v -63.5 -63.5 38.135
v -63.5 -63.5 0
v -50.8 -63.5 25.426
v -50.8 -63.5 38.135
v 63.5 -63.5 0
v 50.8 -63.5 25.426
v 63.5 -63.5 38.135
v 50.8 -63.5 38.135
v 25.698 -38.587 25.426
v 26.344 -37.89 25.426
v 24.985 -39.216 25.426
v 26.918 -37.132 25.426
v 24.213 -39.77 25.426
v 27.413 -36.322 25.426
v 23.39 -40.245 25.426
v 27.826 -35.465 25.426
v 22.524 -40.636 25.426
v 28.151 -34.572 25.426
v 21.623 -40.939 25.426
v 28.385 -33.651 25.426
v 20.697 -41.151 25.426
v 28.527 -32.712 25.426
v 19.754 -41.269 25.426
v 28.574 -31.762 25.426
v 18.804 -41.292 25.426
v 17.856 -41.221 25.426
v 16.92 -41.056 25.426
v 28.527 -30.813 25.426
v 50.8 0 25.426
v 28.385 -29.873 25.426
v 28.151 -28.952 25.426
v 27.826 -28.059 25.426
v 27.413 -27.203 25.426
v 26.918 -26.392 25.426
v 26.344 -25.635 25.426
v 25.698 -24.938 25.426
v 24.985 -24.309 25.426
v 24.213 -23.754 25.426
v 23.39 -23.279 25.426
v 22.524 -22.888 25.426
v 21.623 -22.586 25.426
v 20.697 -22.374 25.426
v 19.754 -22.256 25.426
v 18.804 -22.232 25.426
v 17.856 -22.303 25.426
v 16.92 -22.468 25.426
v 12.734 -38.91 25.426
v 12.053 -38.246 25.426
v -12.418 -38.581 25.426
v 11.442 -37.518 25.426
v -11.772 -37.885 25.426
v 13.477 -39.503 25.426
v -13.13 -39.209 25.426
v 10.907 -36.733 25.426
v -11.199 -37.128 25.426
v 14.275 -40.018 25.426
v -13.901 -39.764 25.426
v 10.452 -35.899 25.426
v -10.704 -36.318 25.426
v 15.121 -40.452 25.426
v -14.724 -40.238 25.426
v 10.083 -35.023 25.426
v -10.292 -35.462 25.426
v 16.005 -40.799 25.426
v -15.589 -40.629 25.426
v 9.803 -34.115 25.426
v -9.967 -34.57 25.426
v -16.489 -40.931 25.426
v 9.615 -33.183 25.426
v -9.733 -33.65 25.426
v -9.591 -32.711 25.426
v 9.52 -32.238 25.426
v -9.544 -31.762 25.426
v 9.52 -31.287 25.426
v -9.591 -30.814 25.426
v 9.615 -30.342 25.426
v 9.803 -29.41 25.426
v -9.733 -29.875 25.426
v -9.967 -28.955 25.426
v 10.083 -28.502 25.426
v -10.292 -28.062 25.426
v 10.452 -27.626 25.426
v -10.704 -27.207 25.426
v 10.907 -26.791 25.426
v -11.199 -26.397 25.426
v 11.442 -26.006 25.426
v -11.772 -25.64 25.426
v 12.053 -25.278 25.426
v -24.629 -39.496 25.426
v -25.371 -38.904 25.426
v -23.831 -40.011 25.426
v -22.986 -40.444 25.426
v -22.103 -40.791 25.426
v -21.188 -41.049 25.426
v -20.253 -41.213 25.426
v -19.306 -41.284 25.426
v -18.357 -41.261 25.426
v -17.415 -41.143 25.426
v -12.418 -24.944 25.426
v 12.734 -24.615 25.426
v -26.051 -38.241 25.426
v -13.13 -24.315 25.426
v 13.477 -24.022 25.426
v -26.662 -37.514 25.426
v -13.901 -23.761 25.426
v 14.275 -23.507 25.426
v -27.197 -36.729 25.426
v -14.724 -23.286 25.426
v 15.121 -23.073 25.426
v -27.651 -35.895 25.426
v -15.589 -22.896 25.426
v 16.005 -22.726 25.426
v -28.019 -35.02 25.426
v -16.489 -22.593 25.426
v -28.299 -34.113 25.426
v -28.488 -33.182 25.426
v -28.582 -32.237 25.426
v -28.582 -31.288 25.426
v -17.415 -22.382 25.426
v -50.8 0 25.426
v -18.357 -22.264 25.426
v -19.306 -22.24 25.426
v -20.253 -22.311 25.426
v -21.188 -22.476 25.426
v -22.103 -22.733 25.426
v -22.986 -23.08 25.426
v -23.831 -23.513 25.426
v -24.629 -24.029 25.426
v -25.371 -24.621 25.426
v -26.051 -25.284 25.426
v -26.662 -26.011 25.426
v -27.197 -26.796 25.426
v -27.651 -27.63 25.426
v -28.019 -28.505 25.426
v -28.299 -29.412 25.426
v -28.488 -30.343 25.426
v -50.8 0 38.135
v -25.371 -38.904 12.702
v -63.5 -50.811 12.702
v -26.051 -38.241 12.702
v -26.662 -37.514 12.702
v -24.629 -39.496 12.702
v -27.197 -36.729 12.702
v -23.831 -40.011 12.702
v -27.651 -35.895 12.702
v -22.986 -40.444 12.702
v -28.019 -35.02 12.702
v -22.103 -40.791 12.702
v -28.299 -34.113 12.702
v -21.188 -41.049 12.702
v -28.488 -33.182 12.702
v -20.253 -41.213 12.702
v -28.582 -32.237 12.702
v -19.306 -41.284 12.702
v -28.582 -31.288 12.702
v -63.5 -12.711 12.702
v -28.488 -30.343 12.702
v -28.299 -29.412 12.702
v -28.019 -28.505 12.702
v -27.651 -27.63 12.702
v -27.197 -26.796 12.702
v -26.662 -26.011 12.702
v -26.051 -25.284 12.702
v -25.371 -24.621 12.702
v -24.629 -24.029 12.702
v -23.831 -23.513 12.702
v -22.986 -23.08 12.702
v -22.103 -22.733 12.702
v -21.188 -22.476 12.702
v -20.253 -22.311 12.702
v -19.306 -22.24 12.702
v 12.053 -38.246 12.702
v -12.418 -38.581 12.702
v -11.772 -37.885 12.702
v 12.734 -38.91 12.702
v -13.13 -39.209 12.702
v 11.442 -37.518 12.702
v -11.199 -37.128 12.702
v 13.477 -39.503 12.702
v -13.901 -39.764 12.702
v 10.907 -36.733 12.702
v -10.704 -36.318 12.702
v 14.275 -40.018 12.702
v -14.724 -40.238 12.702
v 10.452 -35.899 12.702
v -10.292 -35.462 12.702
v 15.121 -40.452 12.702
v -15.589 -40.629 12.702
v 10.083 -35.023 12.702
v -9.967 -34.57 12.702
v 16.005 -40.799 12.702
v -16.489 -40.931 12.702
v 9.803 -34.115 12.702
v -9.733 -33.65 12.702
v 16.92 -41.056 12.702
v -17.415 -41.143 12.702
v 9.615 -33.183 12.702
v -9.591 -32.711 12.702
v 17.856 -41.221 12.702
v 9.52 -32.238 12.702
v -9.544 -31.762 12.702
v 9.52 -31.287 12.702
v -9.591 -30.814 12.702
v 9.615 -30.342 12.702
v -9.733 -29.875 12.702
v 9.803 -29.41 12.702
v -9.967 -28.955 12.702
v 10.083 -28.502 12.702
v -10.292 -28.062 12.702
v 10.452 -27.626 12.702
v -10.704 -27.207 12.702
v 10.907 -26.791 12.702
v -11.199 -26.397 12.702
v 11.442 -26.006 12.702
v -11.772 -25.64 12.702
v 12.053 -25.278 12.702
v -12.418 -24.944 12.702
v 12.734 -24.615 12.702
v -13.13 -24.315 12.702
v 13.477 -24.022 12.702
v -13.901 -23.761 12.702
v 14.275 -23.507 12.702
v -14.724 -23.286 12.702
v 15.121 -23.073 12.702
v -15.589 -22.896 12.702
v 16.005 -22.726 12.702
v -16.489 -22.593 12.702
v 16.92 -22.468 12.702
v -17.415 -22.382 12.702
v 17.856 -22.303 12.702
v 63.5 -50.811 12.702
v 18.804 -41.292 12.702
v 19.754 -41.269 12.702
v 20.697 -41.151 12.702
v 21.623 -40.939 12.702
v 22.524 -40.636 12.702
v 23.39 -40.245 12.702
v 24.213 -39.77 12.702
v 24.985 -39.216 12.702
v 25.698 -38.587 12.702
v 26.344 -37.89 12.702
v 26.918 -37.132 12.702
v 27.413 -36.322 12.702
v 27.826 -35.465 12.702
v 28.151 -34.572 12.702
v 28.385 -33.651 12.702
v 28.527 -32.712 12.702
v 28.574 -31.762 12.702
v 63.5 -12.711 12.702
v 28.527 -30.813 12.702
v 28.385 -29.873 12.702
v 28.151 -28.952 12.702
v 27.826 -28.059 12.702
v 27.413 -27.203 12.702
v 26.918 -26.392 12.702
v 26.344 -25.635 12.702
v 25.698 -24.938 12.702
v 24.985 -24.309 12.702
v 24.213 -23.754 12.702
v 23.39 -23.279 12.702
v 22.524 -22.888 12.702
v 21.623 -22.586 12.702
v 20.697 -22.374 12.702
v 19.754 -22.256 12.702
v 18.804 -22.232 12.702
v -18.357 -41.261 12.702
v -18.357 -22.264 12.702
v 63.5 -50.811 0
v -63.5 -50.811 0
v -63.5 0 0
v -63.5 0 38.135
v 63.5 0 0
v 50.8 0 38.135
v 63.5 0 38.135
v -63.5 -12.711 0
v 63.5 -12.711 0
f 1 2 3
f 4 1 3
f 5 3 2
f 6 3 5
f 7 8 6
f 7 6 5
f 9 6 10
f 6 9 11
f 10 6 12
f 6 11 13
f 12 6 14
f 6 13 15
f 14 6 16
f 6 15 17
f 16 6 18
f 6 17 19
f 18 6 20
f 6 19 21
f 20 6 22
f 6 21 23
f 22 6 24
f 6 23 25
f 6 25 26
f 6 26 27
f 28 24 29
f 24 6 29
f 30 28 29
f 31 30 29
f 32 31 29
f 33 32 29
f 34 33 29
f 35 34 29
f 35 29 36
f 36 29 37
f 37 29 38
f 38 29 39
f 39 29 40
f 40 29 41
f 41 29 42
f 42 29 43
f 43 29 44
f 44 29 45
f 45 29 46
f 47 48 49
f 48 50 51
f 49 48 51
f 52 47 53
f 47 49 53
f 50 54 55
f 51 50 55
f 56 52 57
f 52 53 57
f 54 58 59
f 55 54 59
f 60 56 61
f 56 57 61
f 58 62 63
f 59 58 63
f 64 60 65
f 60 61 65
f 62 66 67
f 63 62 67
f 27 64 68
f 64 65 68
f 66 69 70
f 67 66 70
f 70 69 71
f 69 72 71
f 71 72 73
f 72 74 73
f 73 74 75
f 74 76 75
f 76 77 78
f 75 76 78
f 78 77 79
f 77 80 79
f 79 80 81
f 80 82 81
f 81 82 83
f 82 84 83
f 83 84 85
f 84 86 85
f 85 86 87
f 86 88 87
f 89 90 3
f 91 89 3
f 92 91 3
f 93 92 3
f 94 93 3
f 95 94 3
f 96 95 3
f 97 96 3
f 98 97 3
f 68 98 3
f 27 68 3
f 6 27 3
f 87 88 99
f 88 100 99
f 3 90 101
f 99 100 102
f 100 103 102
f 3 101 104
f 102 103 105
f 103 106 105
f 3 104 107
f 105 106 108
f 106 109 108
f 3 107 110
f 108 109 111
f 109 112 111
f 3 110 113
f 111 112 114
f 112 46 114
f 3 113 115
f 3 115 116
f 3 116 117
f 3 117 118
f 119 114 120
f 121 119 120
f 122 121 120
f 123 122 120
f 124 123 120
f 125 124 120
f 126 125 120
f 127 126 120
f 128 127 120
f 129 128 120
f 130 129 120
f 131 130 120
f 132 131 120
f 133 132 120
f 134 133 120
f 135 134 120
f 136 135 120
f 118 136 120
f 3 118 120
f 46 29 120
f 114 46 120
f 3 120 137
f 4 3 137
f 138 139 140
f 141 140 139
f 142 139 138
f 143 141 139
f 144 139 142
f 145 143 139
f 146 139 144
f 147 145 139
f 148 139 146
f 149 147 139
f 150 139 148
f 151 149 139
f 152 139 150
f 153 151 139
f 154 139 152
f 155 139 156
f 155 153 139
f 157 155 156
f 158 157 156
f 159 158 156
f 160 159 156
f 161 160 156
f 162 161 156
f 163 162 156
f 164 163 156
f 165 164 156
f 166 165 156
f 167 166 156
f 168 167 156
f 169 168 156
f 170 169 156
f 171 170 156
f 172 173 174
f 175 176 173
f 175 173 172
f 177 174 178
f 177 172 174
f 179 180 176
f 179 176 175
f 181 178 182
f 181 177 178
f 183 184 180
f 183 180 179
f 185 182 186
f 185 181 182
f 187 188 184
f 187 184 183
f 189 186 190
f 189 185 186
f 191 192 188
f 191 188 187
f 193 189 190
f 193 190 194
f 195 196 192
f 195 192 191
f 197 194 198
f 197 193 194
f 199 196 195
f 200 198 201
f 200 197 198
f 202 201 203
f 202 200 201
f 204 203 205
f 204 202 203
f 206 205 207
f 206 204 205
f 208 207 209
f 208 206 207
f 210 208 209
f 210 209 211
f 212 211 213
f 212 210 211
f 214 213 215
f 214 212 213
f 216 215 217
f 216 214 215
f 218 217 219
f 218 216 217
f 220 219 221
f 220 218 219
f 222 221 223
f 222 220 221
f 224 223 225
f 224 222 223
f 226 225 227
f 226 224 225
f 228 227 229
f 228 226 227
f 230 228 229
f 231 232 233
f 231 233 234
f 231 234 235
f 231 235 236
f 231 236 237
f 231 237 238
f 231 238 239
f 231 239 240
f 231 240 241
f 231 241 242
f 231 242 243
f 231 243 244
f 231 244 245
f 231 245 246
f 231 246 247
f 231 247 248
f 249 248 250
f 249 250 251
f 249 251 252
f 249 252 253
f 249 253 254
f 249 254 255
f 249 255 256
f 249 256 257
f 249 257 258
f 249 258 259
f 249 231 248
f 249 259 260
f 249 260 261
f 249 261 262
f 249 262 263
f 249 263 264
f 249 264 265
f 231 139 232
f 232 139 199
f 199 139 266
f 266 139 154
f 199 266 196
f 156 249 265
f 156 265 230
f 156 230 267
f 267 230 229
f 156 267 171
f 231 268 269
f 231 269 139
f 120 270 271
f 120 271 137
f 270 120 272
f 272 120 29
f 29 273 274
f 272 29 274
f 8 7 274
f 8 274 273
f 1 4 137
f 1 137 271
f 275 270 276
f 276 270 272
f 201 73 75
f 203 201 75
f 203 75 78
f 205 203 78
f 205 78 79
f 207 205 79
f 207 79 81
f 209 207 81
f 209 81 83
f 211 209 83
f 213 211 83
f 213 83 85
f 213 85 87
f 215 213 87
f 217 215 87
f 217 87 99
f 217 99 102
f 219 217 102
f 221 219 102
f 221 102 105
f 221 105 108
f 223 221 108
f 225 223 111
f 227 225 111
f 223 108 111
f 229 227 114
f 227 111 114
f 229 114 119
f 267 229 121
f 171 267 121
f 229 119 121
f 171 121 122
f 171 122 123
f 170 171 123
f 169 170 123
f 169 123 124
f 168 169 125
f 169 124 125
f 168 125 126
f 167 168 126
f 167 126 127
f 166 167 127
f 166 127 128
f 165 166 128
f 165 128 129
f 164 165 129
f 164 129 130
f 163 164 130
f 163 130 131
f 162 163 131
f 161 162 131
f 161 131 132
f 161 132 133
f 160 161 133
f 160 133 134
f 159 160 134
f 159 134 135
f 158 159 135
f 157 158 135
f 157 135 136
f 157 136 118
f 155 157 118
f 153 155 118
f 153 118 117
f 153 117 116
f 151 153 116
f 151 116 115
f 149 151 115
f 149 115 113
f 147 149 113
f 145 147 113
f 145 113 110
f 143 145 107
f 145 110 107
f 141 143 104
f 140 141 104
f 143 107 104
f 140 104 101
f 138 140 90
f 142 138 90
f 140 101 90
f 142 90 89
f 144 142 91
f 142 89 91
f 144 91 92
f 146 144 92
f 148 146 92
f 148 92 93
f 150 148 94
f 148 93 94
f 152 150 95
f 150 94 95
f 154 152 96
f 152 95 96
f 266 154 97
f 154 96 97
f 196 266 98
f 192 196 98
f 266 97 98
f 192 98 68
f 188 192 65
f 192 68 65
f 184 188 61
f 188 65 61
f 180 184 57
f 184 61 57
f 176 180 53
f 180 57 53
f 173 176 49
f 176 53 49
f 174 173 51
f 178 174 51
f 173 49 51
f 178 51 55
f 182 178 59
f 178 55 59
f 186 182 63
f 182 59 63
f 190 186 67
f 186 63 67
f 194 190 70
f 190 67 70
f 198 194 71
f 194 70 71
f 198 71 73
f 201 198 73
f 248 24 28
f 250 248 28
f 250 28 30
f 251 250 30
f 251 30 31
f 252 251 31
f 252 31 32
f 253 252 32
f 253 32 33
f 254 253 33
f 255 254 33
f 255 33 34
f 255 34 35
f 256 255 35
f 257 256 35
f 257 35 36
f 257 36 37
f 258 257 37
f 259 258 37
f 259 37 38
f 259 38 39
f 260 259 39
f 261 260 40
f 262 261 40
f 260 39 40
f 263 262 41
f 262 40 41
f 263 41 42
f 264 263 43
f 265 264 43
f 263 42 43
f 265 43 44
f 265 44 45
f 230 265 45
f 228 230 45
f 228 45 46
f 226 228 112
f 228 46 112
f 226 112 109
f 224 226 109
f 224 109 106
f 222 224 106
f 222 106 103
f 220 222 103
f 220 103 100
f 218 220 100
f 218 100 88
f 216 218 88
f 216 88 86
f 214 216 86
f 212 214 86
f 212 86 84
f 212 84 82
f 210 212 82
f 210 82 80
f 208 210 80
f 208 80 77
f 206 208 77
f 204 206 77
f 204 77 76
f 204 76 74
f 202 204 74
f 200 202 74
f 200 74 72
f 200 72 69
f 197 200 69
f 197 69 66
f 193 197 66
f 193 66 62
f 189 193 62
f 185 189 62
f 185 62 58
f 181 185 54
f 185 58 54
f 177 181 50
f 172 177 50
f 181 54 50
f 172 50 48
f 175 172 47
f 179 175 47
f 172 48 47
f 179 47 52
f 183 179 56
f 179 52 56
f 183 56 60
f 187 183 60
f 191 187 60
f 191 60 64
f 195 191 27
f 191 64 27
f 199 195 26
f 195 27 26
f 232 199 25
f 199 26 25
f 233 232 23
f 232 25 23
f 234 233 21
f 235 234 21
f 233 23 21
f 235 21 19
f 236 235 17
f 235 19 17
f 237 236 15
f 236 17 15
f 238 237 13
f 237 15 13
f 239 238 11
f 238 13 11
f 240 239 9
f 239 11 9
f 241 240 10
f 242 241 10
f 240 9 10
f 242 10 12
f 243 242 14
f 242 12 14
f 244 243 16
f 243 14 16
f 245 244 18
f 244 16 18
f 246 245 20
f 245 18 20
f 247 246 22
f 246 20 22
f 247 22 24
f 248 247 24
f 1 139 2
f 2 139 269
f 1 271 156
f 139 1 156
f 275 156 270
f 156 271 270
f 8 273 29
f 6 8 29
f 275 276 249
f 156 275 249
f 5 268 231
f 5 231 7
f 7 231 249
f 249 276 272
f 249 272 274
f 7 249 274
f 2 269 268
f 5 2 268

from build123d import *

# Parameters (mm, degrees)
F1_DEPTH = 63.5
F2_W     = 38.1
F2_H     = 12.702099
F3_DEPTH = 127
F4_R     = 9.525
F4_R_2   = 9.533011
F5_DEPTH = 38.1


with BuildPart() as f1:
    # F0 (on Front) → F1 (new body)
    with BuildSketch(Plane.XZ):
        Polygon((-63.5, 0), (0, 0), (63.5, 0), (63.5, 38.135472), (50.8, 38.135472), (50.8, 25.426184), (0, 25.426184), (-50.8, 25.426184), (-50.8, 38.135472), (-63.5, 38.135472), align=None)
    extrude(amount=F1_DEPTH)

    # F2 (on face) → F3 (cut)
    with BuildSketch(Plane.YZ.offset(63.5)):
        with Locations((-31.760516, 6.351049)):
            Rectangle(F2_W, F2_H)
    extrude(amount=-F3_DEPTH, mode=Mode.SUBTRACT)

    # F4 (on face) → F5 (cut)
    with BuildSketch(Plane.XY.offset(25.426184)):
        with Locations((-19.06892, -31.762339)):
            Circle(F4_R)
        with Locations((19.041387, -31.762339)):
            Circle(F4_R_2)
    extrude(amount=-F5_DEPTH, mode=Mode.SUBTRACT)


solid = f1.part
